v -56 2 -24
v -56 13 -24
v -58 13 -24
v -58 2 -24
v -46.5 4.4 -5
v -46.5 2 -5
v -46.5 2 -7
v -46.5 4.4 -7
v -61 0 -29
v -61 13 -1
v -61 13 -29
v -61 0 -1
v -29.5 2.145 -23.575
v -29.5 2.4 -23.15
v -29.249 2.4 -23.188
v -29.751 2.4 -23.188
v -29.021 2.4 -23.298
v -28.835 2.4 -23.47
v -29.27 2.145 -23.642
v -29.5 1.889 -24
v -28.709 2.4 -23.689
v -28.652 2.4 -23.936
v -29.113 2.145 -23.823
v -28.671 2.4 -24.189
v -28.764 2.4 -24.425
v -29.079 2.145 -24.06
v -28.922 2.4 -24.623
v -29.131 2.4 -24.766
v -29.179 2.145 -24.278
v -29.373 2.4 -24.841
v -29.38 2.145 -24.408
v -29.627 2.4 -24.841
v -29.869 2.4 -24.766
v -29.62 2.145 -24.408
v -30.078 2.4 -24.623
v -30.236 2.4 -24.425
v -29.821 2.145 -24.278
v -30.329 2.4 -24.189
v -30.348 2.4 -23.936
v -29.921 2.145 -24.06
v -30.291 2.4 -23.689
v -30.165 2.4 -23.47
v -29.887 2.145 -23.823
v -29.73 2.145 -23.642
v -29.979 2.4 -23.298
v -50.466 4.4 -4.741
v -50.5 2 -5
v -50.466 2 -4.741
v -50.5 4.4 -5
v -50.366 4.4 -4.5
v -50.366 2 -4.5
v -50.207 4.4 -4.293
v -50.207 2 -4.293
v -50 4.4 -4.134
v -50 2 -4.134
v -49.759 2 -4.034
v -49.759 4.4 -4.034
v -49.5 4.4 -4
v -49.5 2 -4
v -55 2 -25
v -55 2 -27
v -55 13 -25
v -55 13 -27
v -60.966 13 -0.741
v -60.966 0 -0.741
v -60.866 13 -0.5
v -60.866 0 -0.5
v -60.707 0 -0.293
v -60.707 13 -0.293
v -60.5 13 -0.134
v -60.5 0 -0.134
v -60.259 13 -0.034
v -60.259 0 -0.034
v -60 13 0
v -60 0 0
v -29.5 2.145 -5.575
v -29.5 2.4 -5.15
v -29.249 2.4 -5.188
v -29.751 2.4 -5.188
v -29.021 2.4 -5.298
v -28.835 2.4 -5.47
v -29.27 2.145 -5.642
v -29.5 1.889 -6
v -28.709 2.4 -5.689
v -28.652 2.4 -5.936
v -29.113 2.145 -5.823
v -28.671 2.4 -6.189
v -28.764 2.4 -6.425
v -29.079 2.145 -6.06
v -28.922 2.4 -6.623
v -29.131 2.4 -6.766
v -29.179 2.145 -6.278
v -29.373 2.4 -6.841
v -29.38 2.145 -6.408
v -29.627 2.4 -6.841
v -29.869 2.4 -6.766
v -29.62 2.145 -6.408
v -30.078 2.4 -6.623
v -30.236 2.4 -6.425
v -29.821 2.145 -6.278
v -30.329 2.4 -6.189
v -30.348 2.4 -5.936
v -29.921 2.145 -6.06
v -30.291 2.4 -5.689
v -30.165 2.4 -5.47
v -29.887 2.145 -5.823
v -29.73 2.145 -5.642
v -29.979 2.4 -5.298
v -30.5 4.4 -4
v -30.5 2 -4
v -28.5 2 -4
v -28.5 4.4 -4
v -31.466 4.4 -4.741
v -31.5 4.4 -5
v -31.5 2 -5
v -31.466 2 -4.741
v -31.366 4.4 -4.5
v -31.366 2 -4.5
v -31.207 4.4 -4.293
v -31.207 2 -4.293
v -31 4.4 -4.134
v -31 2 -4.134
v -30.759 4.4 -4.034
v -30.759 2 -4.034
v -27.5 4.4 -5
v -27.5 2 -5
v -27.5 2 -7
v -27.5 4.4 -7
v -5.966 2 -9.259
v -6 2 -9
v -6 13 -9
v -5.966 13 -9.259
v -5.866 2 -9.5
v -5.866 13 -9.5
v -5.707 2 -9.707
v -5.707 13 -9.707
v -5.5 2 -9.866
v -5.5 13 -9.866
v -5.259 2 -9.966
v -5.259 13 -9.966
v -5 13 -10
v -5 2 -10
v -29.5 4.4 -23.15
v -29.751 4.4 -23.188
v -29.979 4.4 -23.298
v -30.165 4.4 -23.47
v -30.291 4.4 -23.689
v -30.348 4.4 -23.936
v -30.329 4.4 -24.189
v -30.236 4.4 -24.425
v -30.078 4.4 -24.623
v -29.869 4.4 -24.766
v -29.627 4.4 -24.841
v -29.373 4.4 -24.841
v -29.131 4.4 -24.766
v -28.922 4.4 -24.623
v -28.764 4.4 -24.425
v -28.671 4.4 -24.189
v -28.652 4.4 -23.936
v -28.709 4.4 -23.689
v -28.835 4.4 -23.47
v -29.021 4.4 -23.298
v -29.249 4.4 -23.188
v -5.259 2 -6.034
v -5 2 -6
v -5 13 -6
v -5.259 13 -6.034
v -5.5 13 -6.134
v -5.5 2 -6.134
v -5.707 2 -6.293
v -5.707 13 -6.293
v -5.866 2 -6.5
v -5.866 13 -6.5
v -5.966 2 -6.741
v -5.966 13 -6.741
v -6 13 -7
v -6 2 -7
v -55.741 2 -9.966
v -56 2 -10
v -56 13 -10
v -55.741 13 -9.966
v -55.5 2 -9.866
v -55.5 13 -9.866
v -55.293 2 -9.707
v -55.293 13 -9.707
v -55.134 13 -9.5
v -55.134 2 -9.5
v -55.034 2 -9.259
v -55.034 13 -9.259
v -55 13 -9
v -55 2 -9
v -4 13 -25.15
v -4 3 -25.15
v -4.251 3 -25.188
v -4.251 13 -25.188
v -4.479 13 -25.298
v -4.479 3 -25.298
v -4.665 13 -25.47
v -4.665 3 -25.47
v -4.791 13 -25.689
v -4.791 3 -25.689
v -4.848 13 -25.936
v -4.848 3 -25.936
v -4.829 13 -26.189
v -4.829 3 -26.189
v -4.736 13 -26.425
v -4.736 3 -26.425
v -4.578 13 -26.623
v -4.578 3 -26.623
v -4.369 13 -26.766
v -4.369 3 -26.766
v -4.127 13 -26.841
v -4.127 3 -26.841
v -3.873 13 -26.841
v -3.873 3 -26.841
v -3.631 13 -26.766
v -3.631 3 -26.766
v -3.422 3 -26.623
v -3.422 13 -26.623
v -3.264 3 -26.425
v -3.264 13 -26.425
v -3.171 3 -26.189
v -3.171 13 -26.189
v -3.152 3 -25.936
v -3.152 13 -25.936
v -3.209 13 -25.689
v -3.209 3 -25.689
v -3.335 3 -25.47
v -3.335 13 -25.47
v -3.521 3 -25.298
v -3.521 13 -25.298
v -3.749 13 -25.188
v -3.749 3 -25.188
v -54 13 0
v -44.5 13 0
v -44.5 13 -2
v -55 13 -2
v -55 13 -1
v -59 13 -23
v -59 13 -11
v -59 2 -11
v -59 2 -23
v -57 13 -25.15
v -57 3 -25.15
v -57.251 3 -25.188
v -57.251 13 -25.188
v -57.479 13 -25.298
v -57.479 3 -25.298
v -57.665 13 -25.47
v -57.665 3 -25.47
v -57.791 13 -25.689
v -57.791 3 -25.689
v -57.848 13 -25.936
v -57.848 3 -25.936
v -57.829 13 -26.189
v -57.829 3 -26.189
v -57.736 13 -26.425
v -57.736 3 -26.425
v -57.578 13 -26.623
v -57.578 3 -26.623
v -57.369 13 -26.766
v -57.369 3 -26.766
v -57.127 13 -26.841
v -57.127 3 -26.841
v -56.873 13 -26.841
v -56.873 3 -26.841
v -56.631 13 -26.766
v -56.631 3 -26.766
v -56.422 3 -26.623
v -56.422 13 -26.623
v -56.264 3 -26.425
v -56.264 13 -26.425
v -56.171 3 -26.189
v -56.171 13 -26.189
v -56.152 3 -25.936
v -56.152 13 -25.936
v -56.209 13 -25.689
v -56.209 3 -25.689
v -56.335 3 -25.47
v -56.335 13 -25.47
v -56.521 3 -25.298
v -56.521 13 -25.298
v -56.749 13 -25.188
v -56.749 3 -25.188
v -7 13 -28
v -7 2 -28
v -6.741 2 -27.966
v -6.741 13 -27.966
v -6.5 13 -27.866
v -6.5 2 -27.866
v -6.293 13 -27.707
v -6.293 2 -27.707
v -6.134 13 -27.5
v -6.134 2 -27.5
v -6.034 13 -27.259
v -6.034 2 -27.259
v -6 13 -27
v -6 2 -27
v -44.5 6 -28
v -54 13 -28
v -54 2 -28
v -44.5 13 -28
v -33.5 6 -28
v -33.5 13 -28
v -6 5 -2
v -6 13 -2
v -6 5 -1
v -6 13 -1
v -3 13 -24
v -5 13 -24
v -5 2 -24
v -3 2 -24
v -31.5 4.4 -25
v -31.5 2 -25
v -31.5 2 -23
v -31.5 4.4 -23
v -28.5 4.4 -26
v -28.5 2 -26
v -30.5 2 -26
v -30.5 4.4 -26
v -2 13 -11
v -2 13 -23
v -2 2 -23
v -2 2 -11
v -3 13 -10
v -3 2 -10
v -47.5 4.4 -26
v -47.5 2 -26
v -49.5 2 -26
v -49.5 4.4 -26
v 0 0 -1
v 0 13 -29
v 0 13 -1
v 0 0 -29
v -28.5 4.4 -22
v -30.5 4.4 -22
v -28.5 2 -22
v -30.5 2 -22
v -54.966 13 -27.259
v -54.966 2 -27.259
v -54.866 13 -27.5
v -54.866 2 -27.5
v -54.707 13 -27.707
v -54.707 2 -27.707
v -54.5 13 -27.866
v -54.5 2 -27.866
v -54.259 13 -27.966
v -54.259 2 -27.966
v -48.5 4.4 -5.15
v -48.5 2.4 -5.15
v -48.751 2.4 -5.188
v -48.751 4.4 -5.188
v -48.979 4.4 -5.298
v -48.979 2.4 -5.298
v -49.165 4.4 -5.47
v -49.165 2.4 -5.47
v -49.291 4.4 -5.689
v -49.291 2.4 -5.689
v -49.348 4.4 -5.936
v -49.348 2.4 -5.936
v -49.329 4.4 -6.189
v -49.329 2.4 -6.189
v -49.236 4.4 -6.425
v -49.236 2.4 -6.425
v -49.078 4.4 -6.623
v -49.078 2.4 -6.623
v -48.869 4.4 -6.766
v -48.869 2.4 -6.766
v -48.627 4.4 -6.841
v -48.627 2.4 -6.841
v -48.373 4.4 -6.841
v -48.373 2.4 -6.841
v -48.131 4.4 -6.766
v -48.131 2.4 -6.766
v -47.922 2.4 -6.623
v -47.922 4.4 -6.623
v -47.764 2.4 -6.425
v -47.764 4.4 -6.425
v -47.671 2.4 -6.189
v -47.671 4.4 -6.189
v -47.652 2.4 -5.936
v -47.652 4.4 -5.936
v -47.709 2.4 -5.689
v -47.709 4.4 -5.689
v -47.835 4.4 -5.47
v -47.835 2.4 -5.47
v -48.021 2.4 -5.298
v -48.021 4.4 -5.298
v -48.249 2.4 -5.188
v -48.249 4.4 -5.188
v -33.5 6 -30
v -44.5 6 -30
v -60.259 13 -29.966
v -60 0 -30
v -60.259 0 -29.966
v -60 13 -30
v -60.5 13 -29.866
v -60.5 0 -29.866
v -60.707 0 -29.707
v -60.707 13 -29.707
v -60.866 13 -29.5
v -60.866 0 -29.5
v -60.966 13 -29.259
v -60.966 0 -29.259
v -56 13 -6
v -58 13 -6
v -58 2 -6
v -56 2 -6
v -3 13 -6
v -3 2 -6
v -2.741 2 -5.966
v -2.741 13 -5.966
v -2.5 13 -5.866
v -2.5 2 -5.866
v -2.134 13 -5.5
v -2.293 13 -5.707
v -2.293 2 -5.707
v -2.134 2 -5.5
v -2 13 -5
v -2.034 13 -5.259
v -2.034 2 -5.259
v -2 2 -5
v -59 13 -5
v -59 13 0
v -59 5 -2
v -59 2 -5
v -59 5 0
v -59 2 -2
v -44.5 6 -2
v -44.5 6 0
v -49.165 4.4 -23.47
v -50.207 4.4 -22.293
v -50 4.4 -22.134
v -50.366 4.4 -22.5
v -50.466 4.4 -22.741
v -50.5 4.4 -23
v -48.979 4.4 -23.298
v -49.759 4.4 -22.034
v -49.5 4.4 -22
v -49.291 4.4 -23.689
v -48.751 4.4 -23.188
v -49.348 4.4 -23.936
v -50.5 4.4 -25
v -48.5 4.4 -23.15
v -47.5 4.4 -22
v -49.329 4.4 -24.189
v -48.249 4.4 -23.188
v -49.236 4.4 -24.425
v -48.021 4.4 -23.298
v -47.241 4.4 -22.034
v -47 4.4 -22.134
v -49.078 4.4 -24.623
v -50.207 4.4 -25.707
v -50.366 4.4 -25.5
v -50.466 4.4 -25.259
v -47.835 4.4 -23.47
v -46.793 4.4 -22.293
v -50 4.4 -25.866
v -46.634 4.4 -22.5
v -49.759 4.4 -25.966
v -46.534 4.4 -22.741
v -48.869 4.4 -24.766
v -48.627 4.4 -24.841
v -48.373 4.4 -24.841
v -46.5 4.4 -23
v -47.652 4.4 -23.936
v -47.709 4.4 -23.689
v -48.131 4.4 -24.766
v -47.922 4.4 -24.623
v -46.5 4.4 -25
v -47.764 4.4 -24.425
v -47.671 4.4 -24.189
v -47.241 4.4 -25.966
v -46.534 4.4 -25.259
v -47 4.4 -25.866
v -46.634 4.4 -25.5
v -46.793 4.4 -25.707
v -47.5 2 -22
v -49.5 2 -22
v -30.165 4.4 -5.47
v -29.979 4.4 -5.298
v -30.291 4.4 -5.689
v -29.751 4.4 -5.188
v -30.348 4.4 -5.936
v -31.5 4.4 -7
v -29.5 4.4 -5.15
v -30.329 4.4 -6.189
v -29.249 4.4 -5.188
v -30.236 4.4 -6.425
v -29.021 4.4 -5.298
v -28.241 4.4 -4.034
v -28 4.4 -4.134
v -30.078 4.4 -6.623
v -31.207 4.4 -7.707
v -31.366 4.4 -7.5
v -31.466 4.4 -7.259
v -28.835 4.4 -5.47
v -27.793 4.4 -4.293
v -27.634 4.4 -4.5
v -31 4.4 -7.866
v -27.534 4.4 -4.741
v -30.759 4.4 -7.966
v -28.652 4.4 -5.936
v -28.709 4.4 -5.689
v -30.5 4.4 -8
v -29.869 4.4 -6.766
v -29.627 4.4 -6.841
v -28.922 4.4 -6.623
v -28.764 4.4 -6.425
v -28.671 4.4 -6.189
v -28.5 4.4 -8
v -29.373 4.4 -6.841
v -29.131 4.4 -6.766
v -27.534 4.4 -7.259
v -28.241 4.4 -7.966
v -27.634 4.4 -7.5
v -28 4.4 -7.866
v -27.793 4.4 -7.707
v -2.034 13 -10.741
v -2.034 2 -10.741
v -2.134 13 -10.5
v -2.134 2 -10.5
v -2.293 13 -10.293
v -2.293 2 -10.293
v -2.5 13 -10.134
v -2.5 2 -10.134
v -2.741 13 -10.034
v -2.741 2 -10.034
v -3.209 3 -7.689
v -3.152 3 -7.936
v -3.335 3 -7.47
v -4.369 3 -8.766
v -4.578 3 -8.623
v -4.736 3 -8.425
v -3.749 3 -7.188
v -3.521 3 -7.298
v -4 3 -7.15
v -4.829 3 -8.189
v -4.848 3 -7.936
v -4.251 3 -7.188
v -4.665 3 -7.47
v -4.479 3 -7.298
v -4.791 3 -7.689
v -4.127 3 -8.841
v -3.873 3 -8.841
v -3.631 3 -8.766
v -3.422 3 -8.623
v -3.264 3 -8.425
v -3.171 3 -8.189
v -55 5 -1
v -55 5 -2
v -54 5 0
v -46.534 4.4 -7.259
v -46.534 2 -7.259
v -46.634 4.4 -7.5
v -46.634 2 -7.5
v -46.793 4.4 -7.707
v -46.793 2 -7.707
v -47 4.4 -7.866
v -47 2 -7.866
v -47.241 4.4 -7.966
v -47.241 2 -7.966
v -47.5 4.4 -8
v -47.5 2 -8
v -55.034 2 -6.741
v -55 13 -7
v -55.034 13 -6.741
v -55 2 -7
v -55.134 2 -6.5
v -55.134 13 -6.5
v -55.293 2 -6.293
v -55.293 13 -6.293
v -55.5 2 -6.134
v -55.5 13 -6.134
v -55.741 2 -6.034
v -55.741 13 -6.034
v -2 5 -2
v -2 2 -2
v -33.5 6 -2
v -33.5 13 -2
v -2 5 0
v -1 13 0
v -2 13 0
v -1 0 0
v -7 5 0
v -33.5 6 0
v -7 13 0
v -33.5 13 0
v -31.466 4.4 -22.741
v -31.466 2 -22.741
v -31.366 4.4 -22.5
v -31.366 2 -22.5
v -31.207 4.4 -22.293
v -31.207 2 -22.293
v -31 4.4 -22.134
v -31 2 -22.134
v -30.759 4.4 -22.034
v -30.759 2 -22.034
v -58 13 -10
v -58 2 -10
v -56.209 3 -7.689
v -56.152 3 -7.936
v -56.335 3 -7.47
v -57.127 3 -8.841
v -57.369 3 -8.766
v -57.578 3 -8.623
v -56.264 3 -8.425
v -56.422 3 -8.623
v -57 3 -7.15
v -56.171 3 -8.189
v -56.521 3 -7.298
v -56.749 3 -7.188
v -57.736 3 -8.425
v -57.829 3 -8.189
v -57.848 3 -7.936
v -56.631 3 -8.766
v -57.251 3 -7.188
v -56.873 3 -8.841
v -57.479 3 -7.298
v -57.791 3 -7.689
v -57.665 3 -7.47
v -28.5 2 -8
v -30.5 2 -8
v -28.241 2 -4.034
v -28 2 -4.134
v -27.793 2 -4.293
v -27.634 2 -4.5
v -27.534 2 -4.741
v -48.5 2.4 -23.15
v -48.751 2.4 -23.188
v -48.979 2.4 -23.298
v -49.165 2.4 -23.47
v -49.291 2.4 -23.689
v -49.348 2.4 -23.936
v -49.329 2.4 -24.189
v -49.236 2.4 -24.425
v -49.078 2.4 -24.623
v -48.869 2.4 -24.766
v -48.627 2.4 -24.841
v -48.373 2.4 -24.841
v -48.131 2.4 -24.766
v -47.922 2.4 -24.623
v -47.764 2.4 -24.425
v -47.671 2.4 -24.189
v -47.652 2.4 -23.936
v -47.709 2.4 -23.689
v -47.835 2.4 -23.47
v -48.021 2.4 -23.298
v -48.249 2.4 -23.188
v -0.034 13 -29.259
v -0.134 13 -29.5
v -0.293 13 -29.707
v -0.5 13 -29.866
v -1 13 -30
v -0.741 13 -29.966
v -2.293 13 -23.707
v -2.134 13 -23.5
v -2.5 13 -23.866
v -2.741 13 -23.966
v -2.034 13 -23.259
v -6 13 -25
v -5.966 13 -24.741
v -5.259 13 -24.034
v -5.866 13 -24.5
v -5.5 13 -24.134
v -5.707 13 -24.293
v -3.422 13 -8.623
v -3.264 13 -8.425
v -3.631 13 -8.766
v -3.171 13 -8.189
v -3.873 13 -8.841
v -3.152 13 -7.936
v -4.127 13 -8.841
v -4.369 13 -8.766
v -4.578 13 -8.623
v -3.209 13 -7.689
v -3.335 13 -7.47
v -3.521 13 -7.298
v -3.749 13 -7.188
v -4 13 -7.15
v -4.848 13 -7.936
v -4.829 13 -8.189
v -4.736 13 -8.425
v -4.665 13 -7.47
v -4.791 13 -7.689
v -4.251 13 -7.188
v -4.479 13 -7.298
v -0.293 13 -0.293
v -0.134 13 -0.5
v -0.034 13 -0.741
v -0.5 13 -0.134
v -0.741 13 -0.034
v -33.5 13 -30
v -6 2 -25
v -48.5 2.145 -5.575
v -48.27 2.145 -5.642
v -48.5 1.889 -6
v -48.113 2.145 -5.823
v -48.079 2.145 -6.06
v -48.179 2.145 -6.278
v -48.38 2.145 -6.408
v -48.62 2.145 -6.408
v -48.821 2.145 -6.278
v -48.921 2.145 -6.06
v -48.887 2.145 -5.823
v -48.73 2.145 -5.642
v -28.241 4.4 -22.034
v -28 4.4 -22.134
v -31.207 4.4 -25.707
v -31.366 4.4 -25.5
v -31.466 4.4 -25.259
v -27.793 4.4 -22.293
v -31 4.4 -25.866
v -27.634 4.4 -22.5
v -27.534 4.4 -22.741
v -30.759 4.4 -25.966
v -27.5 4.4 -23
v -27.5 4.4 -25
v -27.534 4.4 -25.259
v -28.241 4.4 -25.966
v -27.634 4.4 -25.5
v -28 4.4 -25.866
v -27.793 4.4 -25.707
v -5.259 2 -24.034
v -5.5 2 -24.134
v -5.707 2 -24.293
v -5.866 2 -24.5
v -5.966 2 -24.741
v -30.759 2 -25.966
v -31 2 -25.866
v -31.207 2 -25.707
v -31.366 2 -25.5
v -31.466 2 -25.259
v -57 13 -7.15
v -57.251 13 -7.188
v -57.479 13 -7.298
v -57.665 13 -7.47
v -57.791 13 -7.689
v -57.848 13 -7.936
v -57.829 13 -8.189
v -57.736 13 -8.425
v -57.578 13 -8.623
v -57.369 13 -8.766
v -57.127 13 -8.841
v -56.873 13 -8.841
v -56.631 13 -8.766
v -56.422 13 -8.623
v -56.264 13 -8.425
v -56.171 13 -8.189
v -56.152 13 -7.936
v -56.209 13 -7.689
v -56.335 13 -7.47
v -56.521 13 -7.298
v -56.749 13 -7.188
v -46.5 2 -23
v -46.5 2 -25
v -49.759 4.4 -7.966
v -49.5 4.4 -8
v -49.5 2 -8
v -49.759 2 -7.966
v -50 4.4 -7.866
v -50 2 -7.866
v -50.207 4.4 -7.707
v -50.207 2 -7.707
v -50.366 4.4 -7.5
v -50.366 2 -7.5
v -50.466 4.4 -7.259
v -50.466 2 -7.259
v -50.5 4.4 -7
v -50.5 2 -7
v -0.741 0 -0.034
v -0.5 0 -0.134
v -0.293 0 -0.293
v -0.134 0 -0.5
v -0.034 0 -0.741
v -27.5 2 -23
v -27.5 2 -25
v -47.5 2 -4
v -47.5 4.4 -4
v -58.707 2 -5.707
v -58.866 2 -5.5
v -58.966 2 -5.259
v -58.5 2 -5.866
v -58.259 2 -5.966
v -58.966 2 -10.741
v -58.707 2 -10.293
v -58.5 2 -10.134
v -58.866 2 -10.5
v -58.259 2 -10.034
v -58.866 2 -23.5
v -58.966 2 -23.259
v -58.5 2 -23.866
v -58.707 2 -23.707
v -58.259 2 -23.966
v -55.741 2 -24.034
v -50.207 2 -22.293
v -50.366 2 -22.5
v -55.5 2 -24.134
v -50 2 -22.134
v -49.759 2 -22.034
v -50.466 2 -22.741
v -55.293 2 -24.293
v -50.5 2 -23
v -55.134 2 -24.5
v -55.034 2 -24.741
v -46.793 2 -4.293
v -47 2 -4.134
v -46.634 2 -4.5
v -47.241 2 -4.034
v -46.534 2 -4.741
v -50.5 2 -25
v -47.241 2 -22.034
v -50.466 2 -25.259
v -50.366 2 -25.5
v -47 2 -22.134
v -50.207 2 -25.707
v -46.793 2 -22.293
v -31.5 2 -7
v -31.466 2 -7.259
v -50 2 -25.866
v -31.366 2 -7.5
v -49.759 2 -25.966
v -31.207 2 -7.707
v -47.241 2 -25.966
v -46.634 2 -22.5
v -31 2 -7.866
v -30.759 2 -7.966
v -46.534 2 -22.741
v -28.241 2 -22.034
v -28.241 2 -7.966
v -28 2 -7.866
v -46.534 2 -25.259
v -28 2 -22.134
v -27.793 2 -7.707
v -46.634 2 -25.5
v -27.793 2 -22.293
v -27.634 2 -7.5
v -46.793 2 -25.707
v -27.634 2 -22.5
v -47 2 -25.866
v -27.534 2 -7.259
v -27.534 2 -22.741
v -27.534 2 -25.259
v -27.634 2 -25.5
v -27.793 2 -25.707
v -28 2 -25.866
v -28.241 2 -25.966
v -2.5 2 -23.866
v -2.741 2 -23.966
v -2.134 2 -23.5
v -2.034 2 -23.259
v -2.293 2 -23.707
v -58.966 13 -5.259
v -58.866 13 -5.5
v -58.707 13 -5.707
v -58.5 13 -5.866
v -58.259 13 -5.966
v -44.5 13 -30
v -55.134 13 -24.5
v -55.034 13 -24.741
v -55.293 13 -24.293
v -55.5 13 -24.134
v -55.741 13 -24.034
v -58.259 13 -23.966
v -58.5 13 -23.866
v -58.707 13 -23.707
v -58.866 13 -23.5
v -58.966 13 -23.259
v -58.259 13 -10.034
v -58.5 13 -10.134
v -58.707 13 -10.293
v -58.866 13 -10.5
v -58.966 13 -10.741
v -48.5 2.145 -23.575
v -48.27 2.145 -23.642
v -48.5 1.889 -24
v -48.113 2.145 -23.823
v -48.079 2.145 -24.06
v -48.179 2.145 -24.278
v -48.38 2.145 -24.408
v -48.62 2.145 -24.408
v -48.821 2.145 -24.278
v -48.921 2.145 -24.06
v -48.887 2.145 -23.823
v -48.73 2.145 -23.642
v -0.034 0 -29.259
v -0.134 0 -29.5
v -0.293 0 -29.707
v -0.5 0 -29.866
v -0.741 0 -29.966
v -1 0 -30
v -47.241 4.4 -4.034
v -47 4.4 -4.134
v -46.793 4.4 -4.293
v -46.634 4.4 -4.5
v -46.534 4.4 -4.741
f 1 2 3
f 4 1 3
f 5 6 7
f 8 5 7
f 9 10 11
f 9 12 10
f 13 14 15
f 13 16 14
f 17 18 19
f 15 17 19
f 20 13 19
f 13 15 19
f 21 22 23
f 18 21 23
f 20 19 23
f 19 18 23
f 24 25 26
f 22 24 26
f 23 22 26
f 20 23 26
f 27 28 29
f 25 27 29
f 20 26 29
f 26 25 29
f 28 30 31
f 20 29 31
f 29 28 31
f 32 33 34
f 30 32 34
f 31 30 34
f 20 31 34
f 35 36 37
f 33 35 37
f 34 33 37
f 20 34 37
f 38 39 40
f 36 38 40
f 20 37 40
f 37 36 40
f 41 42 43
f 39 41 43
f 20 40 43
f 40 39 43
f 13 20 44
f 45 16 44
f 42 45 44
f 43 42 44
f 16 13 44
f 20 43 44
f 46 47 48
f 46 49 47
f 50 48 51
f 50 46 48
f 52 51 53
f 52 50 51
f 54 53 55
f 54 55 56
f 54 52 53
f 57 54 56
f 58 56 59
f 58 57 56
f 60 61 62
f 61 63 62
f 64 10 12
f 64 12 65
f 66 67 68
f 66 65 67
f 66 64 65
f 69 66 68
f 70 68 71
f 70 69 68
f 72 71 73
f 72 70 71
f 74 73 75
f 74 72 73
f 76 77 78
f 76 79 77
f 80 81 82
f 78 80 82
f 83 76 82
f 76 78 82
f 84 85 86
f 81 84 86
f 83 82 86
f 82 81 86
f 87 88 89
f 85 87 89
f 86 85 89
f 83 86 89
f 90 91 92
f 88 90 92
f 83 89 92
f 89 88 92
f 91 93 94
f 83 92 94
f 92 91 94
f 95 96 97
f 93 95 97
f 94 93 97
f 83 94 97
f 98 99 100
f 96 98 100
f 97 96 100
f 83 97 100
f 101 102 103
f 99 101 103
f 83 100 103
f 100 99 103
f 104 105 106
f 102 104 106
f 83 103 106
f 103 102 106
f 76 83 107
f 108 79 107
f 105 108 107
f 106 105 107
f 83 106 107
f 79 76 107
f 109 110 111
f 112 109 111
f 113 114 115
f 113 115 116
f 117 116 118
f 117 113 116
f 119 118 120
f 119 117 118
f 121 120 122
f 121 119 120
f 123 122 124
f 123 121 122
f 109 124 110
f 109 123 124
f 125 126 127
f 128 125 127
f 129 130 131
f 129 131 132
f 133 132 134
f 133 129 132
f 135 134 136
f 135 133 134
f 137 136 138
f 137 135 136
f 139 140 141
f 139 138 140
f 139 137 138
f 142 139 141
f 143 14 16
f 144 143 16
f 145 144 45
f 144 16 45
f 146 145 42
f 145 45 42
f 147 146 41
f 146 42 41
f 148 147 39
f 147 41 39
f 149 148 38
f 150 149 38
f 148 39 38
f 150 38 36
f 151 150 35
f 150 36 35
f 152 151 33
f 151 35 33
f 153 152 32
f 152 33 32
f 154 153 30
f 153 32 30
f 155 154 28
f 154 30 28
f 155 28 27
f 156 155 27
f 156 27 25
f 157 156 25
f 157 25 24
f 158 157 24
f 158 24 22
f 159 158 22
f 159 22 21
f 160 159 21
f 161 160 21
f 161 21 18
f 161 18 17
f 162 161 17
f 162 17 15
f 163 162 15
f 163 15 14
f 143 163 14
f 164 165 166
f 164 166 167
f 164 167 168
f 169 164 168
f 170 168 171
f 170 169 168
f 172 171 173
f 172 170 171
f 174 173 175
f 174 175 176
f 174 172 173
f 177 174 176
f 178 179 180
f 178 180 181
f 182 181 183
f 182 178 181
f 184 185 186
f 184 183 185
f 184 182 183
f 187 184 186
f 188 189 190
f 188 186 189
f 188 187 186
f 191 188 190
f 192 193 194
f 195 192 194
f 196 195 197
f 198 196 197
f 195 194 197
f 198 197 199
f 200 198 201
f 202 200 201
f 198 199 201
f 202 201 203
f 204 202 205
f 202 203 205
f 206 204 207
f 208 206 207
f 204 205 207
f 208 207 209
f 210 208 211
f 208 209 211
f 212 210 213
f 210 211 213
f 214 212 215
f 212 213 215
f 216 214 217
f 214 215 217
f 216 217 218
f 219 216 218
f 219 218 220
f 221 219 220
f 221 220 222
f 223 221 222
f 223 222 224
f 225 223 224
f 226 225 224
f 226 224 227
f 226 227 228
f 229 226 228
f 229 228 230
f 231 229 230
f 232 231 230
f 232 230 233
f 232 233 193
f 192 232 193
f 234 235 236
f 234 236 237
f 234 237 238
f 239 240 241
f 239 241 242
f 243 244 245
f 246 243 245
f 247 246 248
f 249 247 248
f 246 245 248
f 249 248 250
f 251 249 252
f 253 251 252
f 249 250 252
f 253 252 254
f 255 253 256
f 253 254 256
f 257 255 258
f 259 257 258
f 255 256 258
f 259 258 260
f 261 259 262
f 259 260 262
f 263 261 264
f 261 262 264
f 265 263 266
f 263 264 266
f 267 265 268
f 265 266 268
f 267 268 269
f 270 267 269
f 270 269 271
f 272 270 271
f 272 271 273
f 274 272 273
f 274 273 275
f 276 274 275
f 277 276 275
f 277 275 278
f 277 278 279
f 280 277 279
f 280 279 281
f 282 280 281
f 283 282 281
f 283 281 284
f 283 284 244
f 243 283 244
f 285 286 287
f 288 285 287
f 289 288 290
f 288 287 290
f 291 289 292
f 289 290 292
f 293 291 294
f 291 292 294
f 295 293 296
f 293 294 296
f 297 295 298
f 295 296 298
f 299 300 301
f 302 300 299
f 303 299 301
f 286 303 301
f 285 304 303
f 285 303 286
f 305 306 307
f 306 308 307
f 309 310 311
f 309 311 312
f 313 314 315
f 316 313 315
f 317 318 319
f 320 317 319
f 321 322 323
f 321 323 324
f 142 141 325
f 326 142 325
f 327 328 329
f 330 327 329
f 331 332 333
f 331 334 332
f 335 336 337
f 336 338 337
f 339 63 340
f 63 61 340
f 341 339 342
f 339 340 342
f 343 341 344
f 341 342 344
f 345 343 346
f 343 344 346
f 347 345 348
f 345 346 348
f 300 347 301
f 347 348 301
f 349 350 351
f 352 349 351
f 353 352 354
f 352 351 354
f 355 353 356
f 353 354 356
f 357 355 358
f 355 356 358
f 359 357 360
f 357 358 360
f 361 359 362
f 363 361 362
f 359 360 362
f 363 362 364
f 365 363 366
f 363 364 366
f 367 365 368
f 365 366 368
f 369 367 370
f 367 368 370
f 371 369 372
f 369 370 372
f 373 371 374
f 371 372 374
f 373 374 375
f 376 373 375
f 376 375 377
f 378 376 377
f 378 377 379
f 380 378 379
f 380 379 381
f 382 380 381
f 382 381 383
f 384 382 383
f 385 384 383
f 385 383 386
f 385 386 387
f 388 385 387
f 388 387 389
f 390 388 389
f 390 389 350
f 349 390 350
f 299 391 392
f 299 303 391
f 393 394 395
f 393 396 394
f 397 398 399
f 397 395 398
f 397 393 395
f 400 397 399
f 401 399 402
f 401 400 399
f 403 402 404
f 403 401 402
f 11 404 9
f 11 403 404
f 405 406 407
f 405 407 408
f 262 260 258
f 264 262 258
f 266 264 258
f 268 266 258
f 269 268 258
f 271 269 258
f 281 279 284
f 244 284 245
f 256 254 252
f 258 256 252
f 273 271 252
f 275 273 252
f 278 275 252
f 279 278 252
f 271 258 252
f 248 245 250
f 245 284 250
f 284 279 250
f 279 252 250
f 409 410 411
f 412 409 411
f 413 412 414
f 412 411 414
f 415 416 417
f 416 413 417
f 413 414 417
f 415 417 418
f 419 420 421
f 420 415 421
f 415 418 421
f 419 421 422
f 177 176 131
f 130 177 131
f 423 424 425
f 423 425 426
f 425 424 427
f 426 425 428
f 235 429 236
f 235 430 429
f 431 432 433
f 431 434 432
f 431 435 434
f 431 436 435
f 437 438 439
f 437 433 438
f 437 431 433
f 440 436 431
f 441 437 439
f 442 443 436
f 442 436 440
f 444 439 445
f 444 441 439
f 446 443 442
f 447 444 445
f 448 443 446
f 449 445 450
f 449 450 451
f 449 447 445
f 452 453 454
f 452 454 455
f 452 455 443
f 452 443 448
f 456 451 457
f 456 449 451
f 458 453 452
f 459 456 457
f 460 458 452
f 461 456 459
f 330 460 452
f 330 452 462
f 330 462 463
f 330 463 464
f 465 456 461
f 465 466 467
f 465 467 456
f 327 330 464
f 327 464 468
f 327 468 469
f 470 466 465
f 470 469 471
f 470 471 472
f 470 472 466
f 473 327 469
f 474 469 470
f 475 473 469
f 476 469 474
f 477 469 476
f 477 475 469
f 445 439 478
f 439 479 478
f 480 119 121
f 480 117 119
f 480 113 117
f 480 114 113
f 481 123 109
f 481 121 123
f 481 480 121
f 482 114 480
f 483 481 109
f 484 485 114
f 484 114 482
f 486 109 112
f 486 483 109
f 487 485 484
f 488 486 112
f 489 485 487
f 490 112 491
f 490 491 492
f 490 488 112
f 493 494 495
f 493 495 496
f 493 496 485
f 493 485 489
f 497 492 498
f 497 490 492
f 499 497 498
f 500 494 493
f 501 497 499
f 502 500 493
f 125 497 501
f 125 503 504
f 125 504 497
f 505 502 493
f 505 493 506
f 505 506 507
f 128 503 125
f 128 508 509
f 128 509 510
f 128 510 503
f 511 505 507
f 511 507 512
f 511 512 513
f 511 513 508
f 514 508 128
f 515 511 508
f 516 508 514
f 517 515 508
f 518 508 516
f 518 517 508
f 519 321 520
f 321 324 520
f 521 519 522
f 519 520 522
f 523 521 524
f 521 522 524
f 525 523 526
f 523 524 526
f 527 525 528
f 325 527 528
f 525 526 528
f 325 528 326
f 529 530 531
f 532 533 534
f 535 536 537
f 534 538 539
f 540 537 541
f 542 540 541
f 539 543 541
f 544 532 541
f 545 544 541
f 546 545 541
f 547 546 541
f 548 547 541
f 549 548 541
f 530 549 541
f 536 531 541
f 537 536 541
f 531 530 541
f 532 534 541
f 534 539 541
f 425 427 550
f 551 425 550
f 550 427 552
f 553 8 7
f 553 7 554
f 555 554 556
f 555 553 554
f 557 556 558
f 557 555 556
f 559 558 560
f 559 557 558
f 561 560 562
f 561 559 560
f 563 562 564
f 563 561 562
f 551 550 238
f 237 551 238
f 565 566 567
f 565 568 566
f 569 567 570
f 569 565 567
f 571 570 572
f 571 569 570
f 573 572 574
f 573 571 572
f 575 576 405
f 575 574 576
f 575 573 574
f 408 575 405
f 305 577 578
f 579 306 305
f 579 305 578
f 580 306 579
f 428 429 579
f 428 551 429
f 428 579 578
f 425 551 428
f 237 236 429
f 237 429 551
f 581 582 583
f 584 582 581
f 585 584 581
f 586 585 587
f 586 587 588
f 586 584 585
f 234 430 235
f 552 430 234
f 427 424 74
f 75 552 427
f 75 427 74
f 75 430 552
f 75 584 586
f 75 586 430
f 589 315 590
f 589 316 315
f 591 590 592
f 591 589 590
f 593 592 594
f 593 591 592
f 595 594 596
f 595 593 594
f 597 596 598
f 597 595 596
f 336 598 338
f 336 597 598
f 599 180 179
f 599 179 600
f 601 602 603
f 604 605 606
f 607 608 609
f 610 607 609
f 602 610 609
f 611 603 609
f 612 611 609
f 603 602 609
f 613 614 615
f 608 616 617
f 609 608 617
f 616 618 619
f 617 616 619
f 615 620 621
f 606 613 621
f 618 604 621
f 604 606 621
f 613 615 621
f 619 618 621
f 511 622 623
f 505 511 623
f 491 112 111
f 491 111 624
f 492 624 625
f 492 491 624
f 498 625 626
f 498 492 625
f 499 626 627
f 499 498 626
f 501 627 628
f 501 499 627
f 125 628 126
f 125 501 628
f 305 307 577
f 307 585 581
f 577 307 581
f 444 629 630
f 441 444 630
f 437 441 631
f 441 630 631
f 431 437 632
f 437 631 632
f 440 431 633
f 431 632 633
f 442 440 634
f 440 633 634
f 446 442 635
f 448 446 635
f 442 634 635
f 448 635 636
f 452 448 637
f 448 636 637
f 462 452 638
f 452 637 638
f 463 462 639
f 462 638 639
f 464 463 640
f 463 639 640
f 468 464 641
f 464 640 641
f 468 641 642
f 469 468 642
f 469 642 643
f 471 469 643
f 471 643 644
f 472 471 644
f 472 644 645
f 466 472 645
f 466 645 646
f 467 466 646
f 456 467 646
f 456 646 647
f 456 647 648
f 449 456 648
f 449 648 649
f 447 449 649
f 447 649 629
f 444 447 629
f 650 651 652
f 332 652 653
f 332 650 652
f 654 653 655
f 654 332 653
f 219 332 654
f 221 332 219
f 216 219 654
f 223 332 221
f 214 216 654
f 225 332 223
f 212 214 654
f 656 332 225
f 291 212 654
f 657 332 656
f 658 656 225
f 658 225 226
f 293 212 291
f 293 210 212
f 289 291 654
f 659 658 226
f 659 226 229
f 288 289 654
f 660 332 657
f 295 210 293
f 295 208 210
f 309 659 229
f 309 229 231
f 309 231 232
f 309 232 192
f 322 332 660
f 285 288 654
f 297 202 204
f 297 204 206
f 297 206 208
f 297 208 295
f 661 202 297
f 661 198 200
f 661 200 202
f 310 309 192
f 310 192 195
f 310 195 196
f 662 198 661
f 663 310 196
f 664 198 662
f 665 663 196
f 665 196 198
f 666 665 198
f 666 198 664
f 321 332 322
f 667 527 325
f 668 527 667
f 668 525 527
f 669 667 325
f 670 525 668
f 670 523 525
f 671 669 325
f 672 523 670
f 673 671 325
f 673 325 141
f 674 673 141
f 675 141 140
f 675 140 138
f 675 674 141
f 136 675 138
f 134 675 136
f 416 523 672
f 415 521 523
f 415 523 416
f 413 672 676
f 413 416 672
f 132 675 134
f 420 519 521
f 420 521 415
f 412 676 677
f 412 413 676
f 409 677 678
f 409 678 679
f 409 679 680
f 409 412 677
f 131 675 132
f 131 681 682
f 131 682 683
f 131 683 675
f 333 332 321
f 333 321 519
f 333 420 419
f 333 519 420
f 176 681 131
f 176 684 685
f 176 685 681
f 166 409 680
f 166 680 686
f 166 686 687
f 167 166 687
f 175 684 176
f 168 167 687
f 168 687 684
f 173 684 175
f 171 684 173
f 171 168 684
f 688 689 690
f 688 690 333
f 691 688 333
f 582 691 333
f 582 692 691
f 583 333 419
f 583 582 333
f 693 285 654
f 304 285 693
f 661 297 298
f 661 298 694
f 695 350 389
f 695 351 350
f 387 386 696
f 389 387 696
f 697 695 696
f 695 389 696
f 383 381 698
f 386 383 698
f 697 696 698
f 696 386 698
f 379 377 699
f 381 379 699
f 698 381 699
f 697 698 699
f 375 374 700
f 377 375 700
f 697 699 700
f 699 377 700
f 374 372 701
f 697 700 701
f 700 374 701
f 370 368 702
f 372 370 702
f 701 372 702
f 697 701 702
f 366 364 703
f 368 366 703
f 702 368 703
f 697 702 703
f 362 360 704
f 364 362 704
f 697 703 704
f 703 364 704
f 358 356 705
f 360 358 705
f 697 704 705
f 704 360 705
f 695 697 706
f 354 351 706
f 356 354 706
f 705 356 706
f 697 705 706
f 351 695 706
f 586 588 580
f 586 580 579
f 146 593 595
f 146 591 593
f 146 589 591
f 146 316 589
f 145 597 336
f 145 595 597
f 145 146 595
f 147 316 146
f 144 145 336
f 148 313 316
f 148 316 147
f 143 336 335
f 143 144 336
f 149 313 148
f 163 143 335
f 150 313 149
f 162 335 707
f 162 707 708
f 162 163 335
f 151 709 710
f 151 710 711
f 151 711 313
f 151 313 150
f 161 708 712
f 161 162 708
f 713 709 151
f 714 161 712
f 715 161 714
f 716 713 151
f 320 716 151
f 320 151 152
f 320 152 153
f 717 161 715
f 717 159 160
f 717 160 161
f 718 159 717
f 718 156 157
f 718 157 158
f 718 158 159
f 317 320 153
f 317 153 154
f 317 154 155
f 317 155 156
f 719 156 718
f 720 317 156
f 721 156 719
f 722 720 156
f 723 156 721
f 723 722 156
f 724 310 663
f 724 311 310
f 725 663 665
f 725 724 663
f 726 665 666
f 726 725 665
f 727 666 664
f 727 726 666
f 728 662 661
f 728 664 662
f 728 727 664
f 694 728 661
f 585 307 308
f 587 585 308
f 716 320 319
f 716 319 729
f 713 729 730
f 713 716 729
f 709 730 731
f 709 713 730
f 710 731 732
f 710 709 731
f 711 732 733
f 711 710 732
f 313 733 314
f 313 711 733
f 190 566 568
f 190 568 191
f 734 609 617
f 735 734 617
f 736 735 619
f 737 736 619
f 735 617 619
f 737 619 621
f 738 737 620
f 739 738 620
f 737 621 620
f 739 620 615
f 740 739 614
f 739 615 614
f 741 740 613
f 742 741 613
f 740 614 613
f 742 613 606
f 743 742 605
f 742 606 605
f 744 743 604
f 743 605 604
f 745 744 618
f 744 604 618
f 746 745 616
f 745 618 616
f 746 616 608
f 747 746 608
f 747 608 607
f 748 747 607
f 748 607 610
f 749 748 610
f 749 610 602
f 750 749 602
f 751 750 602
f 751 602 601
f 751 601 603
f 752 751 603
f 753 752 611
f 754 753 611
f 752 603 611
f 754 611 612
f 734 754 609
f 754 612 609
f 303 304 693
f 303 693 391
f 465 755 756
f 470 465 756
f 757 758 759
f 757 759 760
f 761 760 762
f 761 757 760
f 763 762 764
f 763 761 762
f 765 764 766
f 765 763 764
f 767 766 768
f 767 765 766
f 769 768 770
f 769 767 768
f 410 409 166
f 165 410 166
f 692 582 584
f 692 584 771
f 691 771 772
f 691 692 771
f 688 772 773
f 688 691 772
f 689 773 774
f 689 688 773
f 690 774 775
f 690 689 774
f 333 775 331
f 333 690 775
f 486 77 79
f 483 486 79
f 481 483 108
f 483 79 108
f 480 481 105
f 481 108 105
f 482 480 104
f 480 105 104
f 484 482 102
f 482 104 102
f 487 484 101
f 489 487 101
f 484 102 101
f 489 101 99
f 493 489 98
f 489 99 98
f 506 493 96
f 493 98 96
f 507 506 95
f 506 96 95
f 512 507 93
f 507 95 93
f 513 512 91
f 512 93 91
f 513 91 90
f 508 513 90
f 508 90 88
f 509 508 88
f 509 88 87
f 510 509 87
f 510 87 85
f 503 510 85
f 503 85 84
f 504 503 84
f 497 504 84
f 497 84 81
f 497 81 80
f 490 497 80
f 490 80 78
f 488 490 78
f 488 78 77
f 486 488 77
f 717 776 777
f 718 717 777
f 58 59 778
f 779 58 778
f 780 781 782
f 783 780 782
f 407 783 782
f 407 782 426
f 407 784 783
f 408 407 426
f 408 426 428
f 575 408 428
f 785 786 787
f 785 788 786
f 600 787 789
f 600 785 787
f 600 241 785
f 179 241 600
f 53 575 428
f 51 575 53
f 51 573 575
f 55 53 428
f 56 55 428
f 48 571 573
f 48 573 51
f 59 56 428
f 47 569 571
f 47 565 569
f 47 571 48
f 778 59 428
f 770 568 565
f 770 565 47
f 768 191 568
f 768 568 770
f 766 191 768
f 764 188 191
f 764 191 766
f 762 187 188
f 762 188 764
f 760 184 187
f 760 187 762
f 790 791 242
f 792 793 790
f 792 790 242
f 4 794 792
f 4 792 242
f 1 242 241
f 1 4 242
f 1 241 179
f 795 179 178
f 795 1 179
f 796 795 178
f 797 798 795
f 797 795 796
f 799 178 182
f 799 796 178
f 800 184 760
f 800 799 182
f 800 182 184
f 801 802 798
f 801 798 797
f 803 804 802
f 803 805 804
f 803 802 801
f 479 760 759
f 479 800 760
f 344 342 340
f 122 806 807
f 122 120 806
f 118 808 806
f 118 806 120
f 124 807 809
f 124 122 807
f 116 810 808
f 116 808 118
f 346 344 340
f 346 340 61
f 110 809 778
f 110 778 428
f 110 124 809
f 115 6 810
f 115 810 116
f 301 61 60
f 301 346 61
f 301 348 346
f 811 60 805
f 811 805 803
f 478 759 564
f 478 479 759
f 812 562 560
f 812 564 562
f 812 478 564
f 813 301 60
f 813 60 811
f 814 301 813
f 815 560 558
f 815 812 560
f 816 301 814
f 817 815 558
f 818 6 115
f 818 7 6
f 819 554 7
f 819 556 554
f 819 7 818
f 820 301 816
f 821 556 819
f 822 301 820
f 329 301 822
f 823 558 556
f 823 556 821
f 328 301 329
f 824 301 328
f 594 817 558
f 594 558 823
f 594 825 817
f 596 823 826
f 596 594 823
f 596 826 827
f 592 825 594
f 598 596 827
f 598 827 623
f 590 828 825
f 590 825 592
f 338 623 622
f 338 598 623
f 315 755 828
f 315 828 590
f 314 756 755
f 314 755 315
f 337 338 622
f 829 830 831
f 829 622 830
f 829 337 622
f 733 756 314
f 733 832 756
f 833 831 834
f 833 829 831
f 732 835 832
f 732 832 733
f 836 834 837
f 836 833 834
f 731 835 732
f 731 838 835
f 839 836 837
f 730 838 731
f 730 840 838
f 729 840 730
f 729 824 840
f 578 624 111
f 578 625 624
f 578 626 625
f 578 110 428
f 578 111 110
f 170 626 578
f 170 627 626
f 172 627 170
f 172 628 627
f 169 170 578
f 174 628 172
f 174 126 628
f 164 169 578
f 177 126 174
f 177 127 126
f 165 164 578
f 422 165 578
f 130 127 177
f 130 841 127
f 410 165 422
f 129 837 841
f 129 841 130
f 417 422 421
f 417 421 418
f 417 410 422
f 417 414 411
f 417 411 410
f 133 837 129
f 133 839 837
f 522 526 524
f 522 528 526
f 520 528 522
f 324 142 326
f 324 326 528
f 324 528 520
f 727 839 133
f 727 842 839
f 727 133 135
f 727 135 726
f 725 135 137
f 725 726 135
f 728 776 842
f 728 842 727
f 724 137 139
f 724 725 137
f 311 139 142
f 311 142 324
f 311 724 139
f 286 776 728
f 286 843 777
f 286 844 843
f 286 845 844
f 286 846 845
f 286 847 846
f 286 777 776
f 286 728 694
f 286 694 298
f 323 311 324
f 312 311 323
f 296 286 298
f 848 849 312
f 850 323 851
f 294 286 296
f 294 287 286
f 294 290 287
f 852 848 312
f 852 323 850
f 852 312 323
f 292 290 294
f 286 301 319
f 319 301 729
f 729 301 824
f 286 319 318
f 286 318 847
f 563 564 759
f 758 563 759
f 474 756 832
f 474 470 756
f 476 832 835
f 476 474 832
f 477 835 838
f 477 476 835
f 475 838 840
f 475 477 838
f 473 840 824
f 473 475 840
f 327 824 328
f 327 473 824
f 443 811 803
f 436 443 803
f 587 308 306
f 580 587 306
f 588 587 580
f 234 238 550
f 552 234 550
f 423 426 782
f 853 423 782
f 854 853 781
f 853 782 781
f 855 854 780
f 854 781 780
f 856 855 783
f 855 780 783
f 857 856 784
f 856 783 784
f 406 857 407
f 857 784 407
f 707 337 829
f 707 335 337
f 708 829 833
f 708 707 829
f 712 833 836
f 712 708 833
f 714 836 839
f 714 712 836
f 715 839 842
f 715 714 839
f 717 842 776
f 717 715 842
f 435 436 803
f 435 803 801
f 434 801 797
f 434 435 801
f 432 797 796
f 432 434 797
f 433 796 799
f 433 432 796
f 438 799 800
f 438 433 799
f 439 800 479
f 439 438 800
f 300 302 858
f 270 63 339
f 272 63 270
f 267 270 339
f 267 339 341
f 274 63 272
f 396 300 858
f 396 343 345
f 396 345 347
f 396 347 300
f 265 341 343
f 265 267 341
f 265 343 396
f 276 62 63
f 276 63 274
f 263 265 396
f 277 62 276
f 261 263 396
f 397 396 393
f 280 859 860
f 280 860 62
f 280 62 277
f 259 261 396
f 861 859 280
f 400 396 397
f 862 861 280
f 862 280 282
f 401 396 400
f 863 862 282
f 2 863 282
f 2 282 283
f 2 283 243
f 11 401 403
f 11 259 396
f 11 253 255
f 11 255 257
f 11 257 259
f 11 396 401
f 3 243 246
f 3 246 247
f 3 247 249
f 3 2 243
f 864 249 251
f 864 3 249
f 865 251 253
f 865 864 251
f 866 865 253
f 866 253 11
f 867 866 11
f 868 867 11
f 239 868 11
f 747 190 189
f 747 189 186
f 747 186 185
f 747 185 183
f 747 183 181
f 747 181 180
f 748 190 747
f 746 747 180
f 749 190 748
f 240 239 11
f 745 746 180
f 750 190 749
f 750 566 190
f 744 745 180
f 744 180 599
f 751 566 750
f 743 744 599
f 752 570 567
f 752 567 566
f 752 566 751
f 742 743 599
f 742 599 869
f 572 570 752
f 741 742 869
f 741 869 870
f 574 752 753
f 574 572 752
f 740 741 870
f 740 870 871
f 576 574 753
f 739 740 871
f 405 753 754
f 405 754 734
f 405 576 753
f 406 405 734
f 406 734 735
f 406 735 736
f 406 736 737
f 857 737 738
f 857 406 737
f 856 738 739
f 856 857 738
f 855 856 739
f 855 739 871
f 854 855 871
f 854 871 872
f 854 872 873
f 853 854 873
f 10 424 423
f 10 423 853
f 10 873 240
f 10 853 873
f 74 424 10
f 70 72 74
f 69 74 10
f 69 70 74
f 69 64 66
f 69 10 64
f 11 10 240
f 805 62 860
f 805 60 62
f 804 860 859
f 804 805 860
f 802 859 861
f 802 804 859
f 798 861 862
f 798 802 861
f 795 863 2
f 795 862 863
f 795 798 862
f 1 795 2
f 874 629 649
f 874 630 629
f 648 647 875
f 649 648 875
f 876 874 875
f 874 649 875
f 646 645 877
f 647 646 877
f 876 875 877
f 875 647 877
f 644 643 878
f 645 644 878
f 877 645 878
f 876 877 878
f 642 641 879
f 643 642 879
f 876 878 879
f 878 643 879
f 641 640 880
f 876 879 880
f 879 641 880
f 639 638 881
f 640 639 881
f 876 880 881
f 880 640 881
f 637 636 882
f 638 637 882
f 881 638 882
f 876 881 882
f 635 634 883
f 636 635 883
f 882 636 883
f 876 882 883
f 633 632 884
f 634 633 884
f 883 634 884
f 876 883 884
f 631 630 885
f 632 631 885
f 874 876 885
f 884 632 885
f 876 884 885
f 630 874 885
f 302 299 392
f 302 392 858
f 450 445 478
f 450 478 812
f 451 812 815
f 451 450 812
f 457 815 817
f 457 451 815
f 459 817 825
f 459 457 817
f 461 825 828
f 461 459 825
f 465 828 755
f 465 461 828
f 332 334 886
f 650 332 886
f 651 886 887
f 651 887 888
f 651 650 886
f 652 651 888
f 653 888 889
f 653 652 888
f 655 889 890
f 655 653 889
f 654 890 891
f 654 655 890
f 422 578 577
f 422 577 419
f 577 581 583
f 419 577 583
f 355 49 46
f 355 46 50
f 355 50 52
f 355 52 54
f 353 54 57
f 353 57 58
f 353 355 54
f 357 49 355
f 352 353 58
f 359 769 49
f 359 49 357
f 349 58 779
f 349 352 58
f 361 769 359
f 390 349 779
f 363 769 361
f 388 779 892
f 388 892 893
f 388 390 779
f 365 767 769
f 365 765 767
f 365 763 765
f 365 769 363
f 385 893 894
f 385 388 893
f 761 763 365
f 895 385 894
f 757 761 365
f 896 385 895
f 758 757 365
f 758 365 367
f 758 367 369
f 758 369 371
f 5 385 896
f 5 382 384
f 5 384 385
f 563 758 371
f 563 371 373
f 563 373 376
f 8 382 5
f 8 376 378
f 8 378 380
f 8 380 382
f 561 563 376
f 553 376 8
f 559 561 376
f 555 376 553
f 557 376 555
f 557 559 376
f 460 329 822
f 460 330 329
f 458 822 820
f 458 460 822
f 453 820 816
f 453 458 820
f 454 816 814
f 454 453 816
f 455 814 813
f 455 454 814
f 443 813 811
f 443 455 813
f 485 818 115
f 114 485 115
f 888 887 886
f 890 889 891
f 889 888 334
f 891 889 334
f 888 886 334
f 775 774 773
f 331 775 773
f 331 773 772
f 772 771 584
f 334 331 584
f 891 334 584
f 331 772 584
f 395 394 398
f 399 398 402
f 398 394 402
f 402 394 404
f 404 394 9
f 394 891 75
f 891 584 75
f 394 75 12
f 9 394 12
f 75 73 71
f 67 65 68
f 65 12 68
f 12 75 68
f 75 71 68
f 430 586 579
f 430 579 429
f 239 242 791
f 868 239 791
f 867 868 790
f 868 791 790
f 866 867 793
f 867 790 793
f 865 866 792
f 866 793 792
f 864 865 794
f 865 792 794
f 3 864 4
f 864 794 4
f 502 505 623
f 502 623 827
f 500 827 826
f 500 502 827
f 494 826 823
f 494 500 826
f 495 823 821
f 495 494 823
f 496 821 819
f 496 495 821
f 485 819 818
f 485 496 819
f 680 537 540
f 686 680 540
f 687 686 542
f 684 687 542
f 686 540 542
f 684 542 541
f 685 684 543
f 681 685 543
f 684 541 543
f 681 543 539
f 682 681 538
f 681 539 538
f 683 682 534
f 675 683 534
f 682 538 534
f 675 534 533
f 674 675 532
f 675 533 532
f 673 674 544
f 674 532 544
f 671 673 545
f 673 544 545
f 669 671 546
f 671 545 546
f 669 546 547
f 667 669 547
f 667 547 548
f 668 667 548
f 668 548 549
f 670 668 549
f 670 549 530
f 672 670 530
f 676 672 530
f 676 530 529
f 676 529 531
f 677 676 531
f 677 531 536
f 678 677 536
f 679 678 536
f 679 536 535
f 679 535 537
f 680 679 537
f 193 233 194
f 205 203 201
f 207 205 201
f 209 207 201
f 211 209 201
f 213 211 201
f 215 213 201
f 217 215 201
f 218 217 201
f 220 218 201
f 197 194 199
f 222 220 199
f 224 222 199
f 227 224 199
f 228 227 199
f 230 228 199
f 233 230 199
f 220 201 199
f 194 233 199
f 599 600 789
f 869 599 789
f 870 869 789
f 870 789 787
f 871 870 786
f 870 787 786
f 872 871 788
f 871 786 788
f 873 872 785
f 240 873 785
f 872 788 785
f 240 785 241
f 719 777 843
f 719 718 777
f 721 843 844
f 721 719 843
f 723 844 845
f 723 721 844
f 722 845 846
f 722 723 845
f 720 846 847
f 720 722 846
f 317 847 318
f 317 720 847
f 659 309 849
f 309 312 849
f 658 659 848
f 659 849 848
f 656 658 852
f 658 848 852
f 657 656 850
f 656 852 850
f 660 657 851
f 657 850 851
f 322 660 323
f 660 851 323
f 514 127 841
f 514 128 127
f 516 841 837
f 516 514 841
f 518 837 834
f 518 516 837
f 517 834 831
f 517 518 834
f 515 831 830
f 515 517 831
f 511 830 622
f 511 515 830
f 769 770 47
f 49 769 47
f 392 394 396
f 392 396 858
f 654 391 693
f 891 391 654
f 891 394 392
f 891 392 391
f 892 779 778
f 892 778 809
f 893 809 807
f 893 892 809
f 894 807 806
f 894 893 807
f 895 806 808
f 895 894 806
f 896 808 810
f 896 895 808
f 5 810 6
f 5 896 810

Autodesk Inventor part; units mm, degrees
ref_plane "YZ Plane" through (0, 0, 0) normal (1, 0, 0) x (0, 1, 0)
ref_plane "XZ Plane" through (0, 0, 0) normal (0, 1, 0) x (-1, 0, 0)
ref_plane "XY Plane" through (0, 0, 0) normal (0, 0, 1) x (1, 0, 0)
sketch "Sketch1" plane through (0, 0, 0) normal (0, 1, 0) x (-1, 0, 0)
  line L0 (0, 0) -> (61, 0)
  line L1 (61, 0) -> (61, -30)
  line L2 (61, -30) -> (0, -30)
  line L3 (0, -30) -> (0, 0)
  dimension "d0" = 30
  dimension "d1" = 61
extrude "Extrusion1" add sketch "Sketch1" along normal blind 13
sketch "Sketch4" plane through (0, 13, 0) normal (0, 1, 0) x (1, 0, 0)
  line L0 (-2, 2) -> (-59, 2)
  line L1 (-59, 2) -> (-59, 28)
  line L2 (-59, 28) -> (-2, 28)
  line L3 (-2, 28) -> (-2, 2)
  line L4 (-61, 0) -> (-61, 30) projected
  line L5 (0, 0) -> (-61, 0) projected
  line L6 (0, 30) -> (-61, 30) projected
  line L7 (0, 0) -> (0, 30) projected
  line L8 (-55, 24) -> (-59, 24)
  line L9 (-59, 24) -> (-59, 28)
  line L10 (-59, 28) -> (-55, 28)
  line L11 (-55, 28) -> (-55, 24)
  line L12 (-2, 28) -> (-6, 28)
  line L13 (-6, 28) -> (-6, 24)
  line L14 (-6, 24) -> (-2, 24)
  line L15 (-2, 24) -> (-2, 28)
  line L16 (-59, 6) -> (-55, 6)
  line L17 (-55, 6) -> (-55, 10)
  line L18 (-55, 10) -> (-59, 10)
  line L19 (-59, 10) -> (-59, 6)
  line L20 (-2, 6) -> (-6, 6)
  line L21 (-6, 6) -> (-6, 10)
  line L22 (-6, 10) -> (-2, 10)
  line L23 (-2, 10) -> (-2, 6)
  dimension "d18" = 2
  dimension "d19" = 2
  dimension "d20" = 2
  dimension "d21" = 2
  dimension "d26" = 4
  dimension "d27" = 4
  dimension "d30" = 4
  dimension "d31" = 4
  dimension "d53" = 4
  dimension "d54" = 4
  dimension "d57" = 0
  dimension "d61" = 6
  dimension "d139" = 4
  dimension "d140" = 4
  dimension "d141" = 0
  dimension "d142" = 6
extrude "Extrusion3" cut sketch "Sketch4" against normal blind 11 contours L0 L1 L16 L17 L18 L8 L11 L2 L13 L14 L3 L22 L21 L20
sketch "Sketch5" plane through (-61, 0, 0) normal (0, 0, 1) x (1, 0, 0)
  line L0 (16.5, 13) -> (27.5, 13)
  line L1 (27.5, 13) -> (27.5, 6)
  line L2 (27.5, 6) -> (16.5, 6)
  line L3 (16.5, 6) -> (16.5, 13)
  line L4 (61, 0) -> (61, 13) projected
  line L5 (59, 13) -> (2, 13) projected
  line L6 (0, 0) -> (0, 13) projected
  point P0 (55, 13)
  point P1 (6, 13)
  dimension "d38" = 11
  dimension "d39" = 7
  dimension "d41" = 0
  dimension "d48" = 16.5
extrude "Extrusion6" cut sketch "Sketch5" against normal through all
sketch "Sketch6" plane through (-61, 0, 0) normal (0, 0, 1) x (1, 0, 0)
  line L0 (55, 5) -> (59, 5)
  line L1 (59, 5) -> (59, 13)
  line L2 (59, 13) -> (55, 13)
  line L3 (55, 13) -> (55, 5)
  line L4 (61, 0) -> (61, 13) projected
  line L5 (27.5, 13) -> (61, 13) projected
  line L6 (61, 0) -> (0, 0) projected
  line L7 (2, 5) -> (6, 5)
  line L8 (6, 5) -> (6, 13)
  line L9 (6, 13) -> (2, 13)
  line L10 (2, 13) -> (2, 5)
  line L11 (0, 13) -> (16.5, 13) projected
  line L12 (0, 0) -> (0, 13) projected
  dimension "d45" = 6
  dimension "d47" = 0
  dimension "d50" = 4
  dimension "d63" = 5
  dimension "d64" = 0
  dimension "d65" = 4
  dimension "d66" = 5
  dimension "d67" = 6
extrude "Extrusion7" cut sketch "Sketch6" against normal blind 2
sketch "Sketch9" plane through (0, 2, 0) normal (0, 1, 0) x (1, 0, 0)
  line L0 (-55, 2) -> (-55, 0) projected
  line L1 (-55, 0) -> (-44.5, 0) projected
  line L2 (-44.5, 0) -> (-44.5, 2) projected
  line L3 (-44.5, 2) -> (-55, 2) projected
  line L4 (-6, 0) -> (-6, 2) projected
  line L5 (-6, 2) -> (-33.5, 2) projected
  line L6 (-33.5, 2) -> (-33.5, 0) projected
  line L7 (-33.5, 0) -> (-6, 0) projected
  line L8 (-44.5, 2) -> (-55, 2) projected
  line L9 (-50.5, 4) -> (-46.5, 4)
  line L10 (-46.5, 4) -> (-46.5, 8)
  line L11 (-46.5, 8) -> (-50.5, 8)
  line L12 (-50.5, 8) -> (-50.5, 4)
  line L13 (-46.5, 22) -> (-46.5, 26)
  line L14 (-46.5, 26) -> (-50.5, 26)
  line L15 (-50.5, 26) -> (-50.5, 22)
  line L16 (-50.5, 22) -> (-46.5, 22)
  line L17 (-27.5, 4) -> (-27.5, 8)
  line L18 (-27.5, 8) -> (-31.5, 8)
  line L19 (-31.5, 8) -> (-31.5, 4)
  line L20 (-31.5, 4) -> (-27.5, 4)
  line L21 (-27.5, 22) -> (-27.5, 26)
  line L22 (-27.5, 26) -> (-31.5, 26)
  line L23 (-31.5, 26) -> (-31.5, 22)
  line L24 (-31.5, 22) -> (-27.5, 22)
  line L25 (-55, 28) -> (-6, 28) projected
  line L26 (-44.5, 30) -> (-61, 30) projected
  dimension "d202" = 4
  dimension "d203" = 4
  dimension "d204" = 2
  dimension "d205" = 2
  dimension "d208" = 18
  dimension "d211" = 19
  dimension "d231" = 2
  dimension "d232" = 30
  dimension "d233" = 2
extrude "Extrusion8" add sketch "Sketch9" along normal blind 2.4 contours L12 L11 L10 L9 | L16 L15 L14 L13 | L20 L19 L18 L17 | L24 L23 L22 L21
chamfer "Chamfer2" distance 1 angle 45 2 edges at (-55, 9, 0) (-6, 9, 0)
fillet "Fillet1" radius 1 34 edges at (-61, 6.5, 0) (0, 6.5, 0) (0, 6.5, -30) (-61, 6.5, -30) (-55, 7.5, -24) (-59, 7.5, -24) (-55, 7.5, -28) (-59, 7.5, -6) (-55, 7.5, -6) (-55, 7.5, -10) (-59, 7.5, -10) (-2, 7.5, -6) (-6, 7.5, -6) (-6, 7.5, -10) (-2, 7.5, -10) (-6, 7.5, -24) (-2, 7.5, -24) (-6, 7.5, -28) (-31.5, 3.2, -22) (-27.5, 3.2, -22) (-46.5, 3.2, -22) (-50.5, 3.2, -22) (-46.5, 3.2, -8) (-50.5, 3.2, -8) (-31.5, 3.2, -8) (-27.5, 3.2, -8) (-46.5, 3.2, -4) (-50.5, 3.2, -4) (-31.5, 3.2, -4) (-27.5, 3.2, -4) (-50.5, 3.2, -26) (-46.5, 3.2, -26) (-31.5, 3.2, -26) (-27.5, 3.2, -26)
sketch "Sketch7" plane through (0, 13, 0) normal (0, 1, 0) x (1, 0, 0)
  circle A0 centre (-57, 26) radius 0.75
  circle A1 centre (-4, 26) radius 0.75
  circle A2 centre (-57, 8) radius 0.75
  line L0 (-55, 24) -> (-55, 28) projected
  line L1 (-59, 24) -> (-55, 24) projected
  line L2 (-6, 24) -> (-2, 24) projected
  line L3 (-6, 28) -> (-6, 24) projected
  line L4 (-55, 6) -> (-55, 10) projected
  line L5 (-59, 6) -> (-55, 6) projected
  circle A3 centre (-4, 8) radius 0.75
  line L6 (-6, 10) -> (-6, 6) projected
  line L7 (-6, 6) -> (-2, 6) projected
  point P0 (0, 0)
  dimension "d68" = 1.5
  dimension "d70" = 1.5
  dimension "d71" = 1.5
  dimension "d72" = 2
  dimension "d73" = 2
  dimension "d74" = 2
  dimension "d75" = 2
  dimension "d78" = 2
  dimension "d79" = 2
  dimension "d143" = 1.5
  dimension "d145" = 2
  dimension "d146" = 2
hole "Hole1" at (-57, 13, -26) at (-4, 13, -26) at (-57, 13, -8) at (-4, 13, -8) direction (0, -1, 0) diameter 1.7 depth 10
sketch "Sketch14" plane through (0, 4.4, 0) normal (0, 1, 0) x (1, 0, 0)
  line L0 (-50.5, 7) -> (-50.5, 5) projected
  line L1 (-47.5, 8) -> (-49.5, 8) projected
  point P0 (0, 0)
  point P1 (-48.5, 6)
  point P2 (-49, 3)
  point P3 (-48.5, 24)
  point P4 (-29.5, 6)
  point P5 (-29.5, 24)
  point P6 (-49, 4)
  dimension "d214" = 2
  dimension "d215" = 2
  dimension "d218" = 18
  dimension "d221" = 19
hole "Hole4" at (-48.5, 4.4, -6) at (-48.5, 4.4, -24) at (-29.5, 4.4, -6) at (-29.5, 4.4, -24) direction (0, -1, 0) diameter 1.7 depth 2 tip angle 118
properties part number "Link Adapter"
